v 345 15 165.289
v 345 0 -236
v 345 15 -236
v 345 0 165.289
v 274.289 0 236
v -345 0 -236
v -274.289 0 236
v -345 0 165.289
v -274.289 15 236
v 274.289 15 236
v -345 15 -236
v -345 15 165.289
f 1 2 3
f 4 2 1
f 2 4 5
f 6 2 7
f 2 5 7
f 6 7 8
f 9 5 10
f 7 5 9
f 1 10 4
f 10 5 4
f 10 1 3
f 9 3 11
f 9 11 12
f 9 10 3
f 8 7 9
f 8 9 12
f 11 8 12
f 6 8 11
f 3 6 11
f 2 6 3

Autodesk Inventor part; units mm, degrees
ref_plane "YZ Plane" through (0, 0, 0) normal (1, 0, 0) x (0, 1, 0)
ref_plane "XZ Plane" through (0, 0, 0) normal (0, 1, 0) x (-1, 0, 0)
ref_plane "XY Plane" through (0, 0, 0) normal (0, 0, 1) x (1, 0, 0)
sketch "Sketch1" plane through (0, 0, 0) normal (0, 1, 0) x (-1, 0, 0)
  line L0 (345, -236) -> (-345, -236)
  line L1 (-345, -236) -> (-345, 236)
  line L2 (-345, 236) -> (345, 236)
  line L3 (345, 236) -> (345, -236)
  line L4 (345, -236) -> (-345, 236) construction
  line L5 (-345, -236) -> (345, 236) construction
  line L6 (274.2893, 236) -> (345, 165.2893)
  line L7 (-274.2893, 236) -> (-345, 165.2893)
  line L8 (0, 236) -> (0, -236) construction
  point P0 (0, 0)
  dimension "d0" = 690
  dimension "d1" = 472
  dimension "d3" = 45
  dimension "d4" = 100
extrude "Plate1" add sketch "Sketch1" along normal blind 15 contours L0 L1 L7 L2 L6 L3
equation "\"d2\" = Thickness"
equation "\"BendRadius\" = Thickness"
equation "\"BendReliefWidth\" = Thickness"
equation "\"BendReliefDepth\" = 0.5 * Thickness"
equation "\"TransitionRadius\" = BendRadius"
equation "\"JacobiRadiusSize\" = BendRadius"
equation "\"GapSize\" = Thickness"
equation "\"Thickness\" = 15"
properties part number "фанера 2" material "Wood (Maple)"
